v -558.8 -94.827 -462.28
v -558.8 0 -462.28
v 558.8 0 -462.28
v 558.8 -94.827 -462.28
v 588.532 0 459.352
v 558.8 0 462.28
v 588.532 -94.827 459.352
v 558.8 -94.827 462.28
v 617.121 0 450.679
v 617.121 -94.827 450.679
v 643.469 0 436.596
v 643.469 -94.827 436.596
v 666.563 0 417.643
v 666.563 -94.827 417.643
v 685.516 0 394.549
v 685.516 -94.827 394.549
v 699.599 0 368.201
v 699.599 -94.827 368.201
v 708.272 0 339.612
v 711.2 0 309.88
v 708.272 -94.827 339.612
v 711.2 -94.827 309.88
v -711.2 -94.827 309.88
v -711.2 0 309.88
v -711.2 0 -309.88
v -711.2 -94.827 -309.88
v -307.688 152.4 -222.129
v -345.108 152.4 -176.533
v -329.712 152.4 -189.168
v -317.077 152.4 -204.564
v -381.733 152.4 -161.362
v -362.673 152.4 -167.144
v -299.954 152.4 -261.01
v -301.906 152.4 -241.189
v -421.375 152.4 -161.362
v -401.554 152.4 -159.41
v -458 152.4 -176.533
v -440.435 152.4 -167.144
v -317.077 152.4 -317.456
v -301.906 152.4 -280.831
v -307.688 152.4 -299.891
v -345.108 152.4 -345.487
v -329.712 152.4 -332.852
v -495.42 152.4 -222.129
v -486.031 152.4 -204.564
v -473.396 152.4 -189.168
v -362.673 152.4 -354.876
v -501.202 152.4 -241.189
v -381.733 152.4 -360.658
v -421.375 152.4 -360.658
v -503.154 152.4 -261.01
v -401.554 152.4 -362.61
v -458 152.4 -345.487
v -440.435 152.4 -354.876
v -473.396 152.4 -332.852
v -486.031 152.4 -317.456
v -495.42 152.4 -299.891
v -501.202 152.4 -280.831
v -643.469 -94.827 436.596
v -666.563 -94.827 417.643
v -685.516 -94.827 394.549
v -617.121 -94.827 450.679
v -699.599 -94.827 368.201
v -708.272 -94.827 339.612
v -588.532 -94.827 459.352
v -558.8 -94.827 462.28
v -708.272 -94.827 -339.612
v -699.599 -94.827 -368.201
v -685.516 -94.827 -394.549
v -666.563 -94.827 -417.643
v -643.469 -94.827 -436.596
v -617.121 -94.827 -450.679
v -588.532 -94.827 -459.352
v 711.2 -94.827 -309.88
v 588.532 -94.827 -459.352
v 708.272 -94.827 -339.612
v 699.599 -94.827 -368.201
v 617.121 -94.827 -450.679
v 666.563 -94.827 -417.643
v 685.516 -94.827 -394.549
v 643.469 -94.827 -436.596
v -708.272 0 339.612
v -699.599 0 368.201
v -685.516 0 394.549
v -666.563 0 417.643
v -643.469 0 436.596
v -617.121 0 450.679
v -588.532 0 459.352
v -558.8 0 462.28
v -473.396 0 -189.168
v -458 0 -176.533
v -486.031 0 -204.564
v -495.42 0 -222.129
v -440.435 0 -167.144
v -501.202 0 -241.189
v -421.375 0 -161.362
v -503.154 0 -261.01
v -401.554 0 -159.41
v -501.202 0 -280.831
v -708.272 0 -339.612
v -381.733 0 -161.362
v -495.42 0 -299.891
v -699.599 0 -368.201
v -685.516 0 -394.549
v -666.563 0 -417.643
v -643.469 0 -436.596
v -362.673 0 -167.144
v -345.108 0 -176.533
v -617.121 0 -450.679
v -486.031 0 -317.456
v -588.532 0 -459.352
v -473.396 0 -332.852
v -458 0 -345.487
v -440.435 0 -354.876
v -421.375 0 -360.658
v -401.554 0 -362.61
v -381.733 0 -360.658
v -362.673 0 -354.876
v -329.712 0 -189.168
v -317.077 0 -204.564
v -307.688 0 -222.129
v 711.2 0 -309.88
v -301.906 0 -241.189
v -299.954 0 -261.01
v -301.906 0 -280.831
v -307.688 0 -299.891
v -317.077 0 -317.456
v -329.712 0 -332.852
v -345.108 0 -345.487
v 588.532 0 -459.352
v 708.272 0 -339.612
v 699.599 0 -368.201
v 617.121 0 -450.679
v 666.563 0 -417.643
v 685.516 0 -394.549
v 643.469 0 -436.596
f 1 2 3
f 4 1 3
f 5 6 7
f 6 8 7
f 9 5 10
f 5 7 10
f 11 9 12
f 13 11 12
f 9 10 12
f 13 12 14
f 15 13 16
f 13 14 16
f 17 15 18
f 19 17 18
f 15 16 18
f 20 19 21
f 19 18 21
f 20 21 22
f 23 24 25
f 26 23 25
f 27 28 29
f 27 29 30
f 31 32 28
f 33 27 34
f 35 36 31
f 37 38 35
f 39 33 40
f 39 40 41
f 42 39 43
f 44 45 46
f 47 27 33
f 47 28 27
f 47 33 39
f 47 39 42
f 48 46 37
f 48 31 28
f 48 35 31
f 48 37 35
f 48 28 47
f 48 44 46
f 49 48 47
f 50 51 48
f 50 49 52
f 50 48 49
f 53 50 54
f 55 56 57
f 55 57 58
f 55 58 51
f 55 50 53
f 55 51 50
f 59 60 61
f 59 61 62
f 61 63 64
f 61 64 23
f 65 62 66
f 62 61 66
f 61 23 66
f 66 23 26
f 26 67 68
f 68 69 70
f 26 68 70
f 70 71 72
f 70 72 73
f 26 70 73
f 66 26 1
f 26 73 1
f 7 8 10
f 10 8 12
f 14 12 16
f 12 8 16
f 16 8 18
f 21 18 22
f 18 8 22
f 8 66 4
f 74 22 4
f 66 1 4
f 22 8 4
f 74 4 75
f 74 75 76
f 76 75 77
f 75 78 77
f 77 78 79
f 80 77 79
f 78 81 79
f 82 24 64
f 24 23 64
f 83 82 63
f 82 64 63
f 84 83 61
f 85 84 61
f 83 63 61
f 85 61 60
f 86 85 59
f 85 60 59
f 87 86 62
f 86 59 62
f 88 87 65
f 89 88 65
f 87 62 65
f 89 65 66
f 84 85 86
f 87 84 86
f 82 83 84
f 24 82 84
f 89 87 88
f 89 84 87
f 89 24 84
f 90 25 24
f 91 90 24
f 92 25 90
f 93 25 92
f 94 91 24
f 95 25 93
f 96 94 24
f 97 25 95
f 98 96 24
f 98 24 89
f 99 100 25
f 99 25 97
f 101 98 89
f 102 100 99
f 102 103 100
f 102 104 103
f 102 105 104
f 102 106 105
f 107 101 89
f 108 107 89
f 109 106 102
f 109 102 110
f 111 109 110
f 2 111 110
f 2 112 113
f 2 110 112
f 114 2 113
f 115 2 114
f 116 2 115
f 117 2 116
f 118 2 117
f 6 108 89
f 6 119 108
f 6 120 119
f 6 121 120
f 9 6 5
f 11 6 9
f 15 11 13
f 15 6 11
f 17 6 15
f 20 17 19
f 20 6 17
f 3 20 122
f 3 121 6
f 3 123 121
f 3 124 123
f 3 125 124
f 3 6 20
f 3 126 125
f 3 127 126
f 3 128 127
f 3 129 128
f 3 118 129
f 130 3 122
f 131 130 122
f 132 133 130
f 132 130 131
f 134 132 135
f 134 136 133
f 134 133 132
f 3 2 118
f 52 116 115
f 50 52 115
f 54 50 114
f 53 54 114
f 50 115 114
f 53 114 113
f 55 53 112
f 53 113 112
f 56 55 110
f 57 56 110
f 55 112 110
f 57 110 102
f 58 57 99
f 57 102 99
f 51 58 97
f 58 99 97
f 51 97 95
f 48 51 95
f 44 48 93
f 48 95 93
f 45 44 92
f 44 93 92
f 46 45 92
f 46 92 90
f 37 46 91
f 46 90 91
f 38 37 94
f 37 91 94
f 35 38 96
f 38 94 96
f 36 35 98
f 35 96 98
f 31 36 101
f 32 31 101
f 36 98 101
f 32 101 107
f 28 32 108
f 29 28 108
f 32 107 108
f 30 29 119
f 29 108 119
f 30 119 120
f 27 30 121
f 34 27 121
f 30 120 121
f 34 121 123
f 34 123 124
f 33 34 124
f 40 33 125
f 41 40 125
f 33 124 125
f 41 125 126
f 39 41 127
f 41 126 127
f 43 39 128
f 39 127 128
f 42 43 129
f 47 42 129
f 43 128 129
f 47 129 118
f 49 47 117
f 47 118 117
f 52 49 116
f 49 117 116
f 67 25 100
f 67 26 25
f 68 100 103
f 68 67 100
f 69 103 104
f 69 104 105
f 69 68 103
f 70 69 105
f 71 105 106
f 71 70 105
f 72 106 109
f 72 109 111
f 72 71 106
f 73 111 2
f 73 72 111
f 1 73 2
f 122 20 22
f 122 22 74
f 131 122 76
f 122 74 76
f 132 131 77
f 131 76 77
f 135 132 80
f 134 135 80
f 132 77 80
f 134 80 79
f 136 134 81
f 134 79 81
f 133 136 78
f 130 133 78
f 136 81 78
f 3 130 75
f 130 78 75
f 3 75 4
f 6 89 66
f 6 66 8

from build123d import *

# Parameters (mm, degrees)
SKETCH1_W           = 1422.4
SKETCH1_H           = 924.56
BOSS_EXTRUDE1_DEPTH = 94.826666667
FILLET1_R           = 152.4
SKETCH1_3_R         = 101.6
BOSS_EXTRUDE2_DEPTH = 152.4


with BuildPart() as part:
    # Sketch1 → Boss-Extrude1 (new body)
    with BuildSketch(Plane(origin=(0, 0, 0), x_dir=(1, 0, 0), z_dir=(0, 1, 0))):
        Rectangle(SKETCH1_W, SKETCH1_H)
    extrude(amount=-BOSS_EXTRUDE1_DEPTH)

    # Fillet1
    fillet1_edges = [part.edges().sort_by_distance(p)[0] for p in [
        (-711.2, -47.413333333, -462.28),
        (711.2, -47.413333333, -462.28),
        (711.2, -47.413333333, 462.28),
        (-711.2, -47.413333333, 462.28),
    ]]
    fillet(fillet1_edges, radius=FILLET1_R)

    # Sketch1<3> → Boss-Extrude2 (add)
    with BuildSketch(Plane(origin=(0, 0, 0), x_dir=(1, 0, 0), z_dir=(0, 1, 0))):
        with Locations((-401.553909641, 261.010041267)):
            Circle(SKETCH1_3_R)
    extrude(amount=BOSS_EXTRUDE2_DEPTH)


solid = part.part
